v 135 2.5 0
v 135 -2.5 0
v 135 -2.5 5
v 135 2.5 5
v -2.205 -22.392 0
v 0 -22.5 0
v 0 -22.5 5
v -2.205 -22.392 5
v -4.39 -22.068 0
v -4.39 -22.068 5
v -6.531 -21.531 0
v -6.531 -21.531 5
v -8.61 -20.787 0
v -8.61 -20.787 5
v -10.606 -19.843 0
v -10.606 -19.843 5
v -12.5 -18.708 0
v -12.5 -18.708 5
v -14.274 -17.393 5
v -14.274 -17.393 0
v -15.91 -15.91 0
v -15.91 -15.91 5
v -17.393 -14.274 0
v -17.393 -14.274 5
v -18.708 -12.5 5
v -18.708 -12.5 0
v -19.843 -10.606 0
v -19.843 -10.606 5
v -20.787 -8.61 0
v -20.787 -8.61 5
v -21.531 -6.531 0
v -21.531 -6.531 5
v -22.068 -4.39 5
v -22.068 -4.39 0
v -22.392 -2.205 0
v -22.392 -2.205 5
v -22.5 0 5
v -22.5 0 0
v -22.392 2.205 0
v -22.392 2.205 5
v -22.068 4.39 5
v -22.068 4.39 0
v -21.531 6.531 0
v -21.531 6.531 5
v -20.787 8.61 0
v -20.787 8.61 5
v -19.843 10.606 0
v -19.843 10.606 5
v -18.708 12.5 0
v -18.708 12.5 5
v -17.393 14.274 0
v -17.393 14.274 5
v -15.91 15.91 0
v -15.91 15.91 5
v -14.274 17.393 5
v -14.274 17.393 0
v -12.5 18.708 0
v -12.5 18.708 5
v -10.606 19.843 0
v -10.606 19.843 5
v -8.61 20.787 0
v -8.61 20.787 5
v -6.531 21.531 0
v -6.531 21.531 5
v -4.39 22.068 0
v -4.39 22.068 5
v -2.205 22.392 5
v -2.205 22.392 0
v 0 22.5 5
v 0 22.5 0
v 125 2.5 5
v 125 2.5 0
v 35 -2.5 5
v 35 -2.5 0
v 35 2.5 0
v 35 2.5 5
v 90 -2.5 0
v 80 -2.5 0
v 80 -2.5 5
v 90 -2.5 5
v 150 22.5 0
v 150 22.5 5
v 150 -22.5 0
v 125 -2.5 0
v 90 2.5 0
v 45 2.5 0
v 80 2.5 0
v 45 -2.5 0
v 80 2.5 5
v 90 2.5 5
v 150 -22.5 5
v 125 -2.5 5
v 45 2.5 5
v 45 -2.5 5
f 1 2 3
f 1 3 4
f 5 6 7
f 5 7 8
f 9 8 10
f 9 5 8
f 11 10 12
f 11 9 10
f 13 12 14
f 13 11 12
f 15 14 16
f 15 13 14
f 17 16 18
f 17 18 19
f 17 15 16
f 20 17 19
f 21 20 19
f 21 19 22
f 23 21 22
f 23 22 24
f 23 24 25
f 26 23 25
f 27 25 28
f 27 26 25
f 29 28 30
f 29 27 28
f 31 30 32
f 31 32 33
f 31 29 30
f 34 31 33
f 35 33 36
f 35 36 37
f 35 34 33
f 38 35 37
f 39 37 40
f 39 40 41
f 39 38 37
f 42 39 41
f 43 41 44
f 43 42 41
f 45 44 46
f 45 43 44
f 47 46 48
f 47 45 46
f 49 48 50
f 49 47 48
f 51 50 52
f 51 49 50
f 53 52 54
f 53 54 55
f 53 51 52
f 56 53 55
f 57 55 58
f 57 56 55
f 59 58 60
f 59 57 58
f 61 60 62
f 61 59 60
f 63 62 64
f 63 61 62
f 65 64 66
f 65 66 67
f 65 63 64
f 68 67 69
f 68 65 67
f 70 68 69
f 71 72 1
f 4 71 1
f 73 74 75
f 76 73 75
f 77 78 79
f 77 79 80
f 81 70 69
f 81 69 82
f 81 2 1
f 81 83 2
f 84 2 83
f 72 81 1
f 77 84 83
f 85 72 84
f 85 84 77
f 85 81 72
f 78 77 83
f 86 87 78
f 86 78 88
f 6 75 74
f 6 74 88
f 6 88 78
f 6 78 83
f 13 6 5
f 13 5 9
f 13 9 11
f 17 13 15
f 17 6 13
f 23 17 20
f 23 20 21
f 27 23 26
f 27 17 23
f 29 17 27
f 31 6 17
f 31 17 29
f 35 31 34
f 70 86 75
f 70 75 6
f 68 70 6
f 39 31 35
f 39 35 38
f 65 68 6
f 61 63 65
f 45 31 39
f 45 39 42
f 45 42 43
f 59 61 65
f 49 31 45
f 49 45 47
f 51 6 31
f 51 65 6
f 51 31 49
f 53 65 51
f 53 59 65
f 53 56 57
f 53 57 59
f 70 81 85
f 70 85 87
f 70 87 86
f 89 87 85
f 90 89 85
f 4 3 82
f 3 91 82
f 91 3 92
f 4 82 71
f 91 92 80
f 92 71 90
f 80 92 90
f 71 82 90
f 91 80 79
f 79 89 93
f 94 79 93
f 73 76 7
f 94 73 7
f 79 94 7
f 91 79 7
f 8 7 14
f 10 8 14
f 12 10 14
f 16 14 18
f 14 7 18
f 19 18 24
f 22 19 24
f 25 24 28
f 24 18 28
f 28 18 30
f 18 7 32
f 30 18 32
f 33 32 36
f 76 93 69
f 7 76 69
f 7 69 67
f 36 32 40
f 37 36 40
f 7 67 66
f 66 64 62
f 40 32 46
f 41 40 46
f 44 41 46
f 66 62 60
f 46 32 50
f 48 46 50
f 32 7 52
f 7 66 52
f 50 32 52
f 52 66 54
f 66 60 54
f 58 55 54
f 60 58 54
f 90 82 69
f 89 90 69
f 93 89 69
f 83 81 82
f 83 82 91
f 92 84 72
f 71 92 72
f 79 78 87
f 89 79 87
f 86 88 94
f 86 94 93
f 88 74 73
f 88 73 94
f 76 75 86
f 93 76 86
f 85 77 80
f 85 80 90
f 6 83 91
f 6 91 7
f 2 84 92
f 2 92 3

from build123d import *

# Parameters (mm, degrees)
ESQUISSE1_W        = 10
ESQUISSE1_H        = 5
BOSS_EXTRU_1_DEPTH = 5


with BuildPart() as part:
    # Esquisse1 → Boss.-Extru.1 (new body)
    with BuildSketch(Plane.XY):
        with BuildLine():
            Line((150, 22.5), (0, 22.5))
            ThreePointArc((0, 22.5), (-22.5, 0), (0, -22.5))
            Line((0, -22.5), (150, -22.5))
            Line((150, -22.5), (150, 22.5))
        make_face()
        with Locations((40, 0)):
            Rectangle(ESQUISSE1_W, ESQUISSE1_H, mode=Mode.SUBTRACT)
        with Locations((85, 0)):
            Rectangle(ESQUISSE1_W, ESQUISSE1_H, mode=Mode.SUBTRACT)
        with Locations((130, 0)):
            Rectangle(ESQUISSE1_W, ESQUISSE1_H, mode=Mode.SUBTRACT)
    extrude(amount=BOSS_EXTRU_1_DEPTH)


solid = part.part
